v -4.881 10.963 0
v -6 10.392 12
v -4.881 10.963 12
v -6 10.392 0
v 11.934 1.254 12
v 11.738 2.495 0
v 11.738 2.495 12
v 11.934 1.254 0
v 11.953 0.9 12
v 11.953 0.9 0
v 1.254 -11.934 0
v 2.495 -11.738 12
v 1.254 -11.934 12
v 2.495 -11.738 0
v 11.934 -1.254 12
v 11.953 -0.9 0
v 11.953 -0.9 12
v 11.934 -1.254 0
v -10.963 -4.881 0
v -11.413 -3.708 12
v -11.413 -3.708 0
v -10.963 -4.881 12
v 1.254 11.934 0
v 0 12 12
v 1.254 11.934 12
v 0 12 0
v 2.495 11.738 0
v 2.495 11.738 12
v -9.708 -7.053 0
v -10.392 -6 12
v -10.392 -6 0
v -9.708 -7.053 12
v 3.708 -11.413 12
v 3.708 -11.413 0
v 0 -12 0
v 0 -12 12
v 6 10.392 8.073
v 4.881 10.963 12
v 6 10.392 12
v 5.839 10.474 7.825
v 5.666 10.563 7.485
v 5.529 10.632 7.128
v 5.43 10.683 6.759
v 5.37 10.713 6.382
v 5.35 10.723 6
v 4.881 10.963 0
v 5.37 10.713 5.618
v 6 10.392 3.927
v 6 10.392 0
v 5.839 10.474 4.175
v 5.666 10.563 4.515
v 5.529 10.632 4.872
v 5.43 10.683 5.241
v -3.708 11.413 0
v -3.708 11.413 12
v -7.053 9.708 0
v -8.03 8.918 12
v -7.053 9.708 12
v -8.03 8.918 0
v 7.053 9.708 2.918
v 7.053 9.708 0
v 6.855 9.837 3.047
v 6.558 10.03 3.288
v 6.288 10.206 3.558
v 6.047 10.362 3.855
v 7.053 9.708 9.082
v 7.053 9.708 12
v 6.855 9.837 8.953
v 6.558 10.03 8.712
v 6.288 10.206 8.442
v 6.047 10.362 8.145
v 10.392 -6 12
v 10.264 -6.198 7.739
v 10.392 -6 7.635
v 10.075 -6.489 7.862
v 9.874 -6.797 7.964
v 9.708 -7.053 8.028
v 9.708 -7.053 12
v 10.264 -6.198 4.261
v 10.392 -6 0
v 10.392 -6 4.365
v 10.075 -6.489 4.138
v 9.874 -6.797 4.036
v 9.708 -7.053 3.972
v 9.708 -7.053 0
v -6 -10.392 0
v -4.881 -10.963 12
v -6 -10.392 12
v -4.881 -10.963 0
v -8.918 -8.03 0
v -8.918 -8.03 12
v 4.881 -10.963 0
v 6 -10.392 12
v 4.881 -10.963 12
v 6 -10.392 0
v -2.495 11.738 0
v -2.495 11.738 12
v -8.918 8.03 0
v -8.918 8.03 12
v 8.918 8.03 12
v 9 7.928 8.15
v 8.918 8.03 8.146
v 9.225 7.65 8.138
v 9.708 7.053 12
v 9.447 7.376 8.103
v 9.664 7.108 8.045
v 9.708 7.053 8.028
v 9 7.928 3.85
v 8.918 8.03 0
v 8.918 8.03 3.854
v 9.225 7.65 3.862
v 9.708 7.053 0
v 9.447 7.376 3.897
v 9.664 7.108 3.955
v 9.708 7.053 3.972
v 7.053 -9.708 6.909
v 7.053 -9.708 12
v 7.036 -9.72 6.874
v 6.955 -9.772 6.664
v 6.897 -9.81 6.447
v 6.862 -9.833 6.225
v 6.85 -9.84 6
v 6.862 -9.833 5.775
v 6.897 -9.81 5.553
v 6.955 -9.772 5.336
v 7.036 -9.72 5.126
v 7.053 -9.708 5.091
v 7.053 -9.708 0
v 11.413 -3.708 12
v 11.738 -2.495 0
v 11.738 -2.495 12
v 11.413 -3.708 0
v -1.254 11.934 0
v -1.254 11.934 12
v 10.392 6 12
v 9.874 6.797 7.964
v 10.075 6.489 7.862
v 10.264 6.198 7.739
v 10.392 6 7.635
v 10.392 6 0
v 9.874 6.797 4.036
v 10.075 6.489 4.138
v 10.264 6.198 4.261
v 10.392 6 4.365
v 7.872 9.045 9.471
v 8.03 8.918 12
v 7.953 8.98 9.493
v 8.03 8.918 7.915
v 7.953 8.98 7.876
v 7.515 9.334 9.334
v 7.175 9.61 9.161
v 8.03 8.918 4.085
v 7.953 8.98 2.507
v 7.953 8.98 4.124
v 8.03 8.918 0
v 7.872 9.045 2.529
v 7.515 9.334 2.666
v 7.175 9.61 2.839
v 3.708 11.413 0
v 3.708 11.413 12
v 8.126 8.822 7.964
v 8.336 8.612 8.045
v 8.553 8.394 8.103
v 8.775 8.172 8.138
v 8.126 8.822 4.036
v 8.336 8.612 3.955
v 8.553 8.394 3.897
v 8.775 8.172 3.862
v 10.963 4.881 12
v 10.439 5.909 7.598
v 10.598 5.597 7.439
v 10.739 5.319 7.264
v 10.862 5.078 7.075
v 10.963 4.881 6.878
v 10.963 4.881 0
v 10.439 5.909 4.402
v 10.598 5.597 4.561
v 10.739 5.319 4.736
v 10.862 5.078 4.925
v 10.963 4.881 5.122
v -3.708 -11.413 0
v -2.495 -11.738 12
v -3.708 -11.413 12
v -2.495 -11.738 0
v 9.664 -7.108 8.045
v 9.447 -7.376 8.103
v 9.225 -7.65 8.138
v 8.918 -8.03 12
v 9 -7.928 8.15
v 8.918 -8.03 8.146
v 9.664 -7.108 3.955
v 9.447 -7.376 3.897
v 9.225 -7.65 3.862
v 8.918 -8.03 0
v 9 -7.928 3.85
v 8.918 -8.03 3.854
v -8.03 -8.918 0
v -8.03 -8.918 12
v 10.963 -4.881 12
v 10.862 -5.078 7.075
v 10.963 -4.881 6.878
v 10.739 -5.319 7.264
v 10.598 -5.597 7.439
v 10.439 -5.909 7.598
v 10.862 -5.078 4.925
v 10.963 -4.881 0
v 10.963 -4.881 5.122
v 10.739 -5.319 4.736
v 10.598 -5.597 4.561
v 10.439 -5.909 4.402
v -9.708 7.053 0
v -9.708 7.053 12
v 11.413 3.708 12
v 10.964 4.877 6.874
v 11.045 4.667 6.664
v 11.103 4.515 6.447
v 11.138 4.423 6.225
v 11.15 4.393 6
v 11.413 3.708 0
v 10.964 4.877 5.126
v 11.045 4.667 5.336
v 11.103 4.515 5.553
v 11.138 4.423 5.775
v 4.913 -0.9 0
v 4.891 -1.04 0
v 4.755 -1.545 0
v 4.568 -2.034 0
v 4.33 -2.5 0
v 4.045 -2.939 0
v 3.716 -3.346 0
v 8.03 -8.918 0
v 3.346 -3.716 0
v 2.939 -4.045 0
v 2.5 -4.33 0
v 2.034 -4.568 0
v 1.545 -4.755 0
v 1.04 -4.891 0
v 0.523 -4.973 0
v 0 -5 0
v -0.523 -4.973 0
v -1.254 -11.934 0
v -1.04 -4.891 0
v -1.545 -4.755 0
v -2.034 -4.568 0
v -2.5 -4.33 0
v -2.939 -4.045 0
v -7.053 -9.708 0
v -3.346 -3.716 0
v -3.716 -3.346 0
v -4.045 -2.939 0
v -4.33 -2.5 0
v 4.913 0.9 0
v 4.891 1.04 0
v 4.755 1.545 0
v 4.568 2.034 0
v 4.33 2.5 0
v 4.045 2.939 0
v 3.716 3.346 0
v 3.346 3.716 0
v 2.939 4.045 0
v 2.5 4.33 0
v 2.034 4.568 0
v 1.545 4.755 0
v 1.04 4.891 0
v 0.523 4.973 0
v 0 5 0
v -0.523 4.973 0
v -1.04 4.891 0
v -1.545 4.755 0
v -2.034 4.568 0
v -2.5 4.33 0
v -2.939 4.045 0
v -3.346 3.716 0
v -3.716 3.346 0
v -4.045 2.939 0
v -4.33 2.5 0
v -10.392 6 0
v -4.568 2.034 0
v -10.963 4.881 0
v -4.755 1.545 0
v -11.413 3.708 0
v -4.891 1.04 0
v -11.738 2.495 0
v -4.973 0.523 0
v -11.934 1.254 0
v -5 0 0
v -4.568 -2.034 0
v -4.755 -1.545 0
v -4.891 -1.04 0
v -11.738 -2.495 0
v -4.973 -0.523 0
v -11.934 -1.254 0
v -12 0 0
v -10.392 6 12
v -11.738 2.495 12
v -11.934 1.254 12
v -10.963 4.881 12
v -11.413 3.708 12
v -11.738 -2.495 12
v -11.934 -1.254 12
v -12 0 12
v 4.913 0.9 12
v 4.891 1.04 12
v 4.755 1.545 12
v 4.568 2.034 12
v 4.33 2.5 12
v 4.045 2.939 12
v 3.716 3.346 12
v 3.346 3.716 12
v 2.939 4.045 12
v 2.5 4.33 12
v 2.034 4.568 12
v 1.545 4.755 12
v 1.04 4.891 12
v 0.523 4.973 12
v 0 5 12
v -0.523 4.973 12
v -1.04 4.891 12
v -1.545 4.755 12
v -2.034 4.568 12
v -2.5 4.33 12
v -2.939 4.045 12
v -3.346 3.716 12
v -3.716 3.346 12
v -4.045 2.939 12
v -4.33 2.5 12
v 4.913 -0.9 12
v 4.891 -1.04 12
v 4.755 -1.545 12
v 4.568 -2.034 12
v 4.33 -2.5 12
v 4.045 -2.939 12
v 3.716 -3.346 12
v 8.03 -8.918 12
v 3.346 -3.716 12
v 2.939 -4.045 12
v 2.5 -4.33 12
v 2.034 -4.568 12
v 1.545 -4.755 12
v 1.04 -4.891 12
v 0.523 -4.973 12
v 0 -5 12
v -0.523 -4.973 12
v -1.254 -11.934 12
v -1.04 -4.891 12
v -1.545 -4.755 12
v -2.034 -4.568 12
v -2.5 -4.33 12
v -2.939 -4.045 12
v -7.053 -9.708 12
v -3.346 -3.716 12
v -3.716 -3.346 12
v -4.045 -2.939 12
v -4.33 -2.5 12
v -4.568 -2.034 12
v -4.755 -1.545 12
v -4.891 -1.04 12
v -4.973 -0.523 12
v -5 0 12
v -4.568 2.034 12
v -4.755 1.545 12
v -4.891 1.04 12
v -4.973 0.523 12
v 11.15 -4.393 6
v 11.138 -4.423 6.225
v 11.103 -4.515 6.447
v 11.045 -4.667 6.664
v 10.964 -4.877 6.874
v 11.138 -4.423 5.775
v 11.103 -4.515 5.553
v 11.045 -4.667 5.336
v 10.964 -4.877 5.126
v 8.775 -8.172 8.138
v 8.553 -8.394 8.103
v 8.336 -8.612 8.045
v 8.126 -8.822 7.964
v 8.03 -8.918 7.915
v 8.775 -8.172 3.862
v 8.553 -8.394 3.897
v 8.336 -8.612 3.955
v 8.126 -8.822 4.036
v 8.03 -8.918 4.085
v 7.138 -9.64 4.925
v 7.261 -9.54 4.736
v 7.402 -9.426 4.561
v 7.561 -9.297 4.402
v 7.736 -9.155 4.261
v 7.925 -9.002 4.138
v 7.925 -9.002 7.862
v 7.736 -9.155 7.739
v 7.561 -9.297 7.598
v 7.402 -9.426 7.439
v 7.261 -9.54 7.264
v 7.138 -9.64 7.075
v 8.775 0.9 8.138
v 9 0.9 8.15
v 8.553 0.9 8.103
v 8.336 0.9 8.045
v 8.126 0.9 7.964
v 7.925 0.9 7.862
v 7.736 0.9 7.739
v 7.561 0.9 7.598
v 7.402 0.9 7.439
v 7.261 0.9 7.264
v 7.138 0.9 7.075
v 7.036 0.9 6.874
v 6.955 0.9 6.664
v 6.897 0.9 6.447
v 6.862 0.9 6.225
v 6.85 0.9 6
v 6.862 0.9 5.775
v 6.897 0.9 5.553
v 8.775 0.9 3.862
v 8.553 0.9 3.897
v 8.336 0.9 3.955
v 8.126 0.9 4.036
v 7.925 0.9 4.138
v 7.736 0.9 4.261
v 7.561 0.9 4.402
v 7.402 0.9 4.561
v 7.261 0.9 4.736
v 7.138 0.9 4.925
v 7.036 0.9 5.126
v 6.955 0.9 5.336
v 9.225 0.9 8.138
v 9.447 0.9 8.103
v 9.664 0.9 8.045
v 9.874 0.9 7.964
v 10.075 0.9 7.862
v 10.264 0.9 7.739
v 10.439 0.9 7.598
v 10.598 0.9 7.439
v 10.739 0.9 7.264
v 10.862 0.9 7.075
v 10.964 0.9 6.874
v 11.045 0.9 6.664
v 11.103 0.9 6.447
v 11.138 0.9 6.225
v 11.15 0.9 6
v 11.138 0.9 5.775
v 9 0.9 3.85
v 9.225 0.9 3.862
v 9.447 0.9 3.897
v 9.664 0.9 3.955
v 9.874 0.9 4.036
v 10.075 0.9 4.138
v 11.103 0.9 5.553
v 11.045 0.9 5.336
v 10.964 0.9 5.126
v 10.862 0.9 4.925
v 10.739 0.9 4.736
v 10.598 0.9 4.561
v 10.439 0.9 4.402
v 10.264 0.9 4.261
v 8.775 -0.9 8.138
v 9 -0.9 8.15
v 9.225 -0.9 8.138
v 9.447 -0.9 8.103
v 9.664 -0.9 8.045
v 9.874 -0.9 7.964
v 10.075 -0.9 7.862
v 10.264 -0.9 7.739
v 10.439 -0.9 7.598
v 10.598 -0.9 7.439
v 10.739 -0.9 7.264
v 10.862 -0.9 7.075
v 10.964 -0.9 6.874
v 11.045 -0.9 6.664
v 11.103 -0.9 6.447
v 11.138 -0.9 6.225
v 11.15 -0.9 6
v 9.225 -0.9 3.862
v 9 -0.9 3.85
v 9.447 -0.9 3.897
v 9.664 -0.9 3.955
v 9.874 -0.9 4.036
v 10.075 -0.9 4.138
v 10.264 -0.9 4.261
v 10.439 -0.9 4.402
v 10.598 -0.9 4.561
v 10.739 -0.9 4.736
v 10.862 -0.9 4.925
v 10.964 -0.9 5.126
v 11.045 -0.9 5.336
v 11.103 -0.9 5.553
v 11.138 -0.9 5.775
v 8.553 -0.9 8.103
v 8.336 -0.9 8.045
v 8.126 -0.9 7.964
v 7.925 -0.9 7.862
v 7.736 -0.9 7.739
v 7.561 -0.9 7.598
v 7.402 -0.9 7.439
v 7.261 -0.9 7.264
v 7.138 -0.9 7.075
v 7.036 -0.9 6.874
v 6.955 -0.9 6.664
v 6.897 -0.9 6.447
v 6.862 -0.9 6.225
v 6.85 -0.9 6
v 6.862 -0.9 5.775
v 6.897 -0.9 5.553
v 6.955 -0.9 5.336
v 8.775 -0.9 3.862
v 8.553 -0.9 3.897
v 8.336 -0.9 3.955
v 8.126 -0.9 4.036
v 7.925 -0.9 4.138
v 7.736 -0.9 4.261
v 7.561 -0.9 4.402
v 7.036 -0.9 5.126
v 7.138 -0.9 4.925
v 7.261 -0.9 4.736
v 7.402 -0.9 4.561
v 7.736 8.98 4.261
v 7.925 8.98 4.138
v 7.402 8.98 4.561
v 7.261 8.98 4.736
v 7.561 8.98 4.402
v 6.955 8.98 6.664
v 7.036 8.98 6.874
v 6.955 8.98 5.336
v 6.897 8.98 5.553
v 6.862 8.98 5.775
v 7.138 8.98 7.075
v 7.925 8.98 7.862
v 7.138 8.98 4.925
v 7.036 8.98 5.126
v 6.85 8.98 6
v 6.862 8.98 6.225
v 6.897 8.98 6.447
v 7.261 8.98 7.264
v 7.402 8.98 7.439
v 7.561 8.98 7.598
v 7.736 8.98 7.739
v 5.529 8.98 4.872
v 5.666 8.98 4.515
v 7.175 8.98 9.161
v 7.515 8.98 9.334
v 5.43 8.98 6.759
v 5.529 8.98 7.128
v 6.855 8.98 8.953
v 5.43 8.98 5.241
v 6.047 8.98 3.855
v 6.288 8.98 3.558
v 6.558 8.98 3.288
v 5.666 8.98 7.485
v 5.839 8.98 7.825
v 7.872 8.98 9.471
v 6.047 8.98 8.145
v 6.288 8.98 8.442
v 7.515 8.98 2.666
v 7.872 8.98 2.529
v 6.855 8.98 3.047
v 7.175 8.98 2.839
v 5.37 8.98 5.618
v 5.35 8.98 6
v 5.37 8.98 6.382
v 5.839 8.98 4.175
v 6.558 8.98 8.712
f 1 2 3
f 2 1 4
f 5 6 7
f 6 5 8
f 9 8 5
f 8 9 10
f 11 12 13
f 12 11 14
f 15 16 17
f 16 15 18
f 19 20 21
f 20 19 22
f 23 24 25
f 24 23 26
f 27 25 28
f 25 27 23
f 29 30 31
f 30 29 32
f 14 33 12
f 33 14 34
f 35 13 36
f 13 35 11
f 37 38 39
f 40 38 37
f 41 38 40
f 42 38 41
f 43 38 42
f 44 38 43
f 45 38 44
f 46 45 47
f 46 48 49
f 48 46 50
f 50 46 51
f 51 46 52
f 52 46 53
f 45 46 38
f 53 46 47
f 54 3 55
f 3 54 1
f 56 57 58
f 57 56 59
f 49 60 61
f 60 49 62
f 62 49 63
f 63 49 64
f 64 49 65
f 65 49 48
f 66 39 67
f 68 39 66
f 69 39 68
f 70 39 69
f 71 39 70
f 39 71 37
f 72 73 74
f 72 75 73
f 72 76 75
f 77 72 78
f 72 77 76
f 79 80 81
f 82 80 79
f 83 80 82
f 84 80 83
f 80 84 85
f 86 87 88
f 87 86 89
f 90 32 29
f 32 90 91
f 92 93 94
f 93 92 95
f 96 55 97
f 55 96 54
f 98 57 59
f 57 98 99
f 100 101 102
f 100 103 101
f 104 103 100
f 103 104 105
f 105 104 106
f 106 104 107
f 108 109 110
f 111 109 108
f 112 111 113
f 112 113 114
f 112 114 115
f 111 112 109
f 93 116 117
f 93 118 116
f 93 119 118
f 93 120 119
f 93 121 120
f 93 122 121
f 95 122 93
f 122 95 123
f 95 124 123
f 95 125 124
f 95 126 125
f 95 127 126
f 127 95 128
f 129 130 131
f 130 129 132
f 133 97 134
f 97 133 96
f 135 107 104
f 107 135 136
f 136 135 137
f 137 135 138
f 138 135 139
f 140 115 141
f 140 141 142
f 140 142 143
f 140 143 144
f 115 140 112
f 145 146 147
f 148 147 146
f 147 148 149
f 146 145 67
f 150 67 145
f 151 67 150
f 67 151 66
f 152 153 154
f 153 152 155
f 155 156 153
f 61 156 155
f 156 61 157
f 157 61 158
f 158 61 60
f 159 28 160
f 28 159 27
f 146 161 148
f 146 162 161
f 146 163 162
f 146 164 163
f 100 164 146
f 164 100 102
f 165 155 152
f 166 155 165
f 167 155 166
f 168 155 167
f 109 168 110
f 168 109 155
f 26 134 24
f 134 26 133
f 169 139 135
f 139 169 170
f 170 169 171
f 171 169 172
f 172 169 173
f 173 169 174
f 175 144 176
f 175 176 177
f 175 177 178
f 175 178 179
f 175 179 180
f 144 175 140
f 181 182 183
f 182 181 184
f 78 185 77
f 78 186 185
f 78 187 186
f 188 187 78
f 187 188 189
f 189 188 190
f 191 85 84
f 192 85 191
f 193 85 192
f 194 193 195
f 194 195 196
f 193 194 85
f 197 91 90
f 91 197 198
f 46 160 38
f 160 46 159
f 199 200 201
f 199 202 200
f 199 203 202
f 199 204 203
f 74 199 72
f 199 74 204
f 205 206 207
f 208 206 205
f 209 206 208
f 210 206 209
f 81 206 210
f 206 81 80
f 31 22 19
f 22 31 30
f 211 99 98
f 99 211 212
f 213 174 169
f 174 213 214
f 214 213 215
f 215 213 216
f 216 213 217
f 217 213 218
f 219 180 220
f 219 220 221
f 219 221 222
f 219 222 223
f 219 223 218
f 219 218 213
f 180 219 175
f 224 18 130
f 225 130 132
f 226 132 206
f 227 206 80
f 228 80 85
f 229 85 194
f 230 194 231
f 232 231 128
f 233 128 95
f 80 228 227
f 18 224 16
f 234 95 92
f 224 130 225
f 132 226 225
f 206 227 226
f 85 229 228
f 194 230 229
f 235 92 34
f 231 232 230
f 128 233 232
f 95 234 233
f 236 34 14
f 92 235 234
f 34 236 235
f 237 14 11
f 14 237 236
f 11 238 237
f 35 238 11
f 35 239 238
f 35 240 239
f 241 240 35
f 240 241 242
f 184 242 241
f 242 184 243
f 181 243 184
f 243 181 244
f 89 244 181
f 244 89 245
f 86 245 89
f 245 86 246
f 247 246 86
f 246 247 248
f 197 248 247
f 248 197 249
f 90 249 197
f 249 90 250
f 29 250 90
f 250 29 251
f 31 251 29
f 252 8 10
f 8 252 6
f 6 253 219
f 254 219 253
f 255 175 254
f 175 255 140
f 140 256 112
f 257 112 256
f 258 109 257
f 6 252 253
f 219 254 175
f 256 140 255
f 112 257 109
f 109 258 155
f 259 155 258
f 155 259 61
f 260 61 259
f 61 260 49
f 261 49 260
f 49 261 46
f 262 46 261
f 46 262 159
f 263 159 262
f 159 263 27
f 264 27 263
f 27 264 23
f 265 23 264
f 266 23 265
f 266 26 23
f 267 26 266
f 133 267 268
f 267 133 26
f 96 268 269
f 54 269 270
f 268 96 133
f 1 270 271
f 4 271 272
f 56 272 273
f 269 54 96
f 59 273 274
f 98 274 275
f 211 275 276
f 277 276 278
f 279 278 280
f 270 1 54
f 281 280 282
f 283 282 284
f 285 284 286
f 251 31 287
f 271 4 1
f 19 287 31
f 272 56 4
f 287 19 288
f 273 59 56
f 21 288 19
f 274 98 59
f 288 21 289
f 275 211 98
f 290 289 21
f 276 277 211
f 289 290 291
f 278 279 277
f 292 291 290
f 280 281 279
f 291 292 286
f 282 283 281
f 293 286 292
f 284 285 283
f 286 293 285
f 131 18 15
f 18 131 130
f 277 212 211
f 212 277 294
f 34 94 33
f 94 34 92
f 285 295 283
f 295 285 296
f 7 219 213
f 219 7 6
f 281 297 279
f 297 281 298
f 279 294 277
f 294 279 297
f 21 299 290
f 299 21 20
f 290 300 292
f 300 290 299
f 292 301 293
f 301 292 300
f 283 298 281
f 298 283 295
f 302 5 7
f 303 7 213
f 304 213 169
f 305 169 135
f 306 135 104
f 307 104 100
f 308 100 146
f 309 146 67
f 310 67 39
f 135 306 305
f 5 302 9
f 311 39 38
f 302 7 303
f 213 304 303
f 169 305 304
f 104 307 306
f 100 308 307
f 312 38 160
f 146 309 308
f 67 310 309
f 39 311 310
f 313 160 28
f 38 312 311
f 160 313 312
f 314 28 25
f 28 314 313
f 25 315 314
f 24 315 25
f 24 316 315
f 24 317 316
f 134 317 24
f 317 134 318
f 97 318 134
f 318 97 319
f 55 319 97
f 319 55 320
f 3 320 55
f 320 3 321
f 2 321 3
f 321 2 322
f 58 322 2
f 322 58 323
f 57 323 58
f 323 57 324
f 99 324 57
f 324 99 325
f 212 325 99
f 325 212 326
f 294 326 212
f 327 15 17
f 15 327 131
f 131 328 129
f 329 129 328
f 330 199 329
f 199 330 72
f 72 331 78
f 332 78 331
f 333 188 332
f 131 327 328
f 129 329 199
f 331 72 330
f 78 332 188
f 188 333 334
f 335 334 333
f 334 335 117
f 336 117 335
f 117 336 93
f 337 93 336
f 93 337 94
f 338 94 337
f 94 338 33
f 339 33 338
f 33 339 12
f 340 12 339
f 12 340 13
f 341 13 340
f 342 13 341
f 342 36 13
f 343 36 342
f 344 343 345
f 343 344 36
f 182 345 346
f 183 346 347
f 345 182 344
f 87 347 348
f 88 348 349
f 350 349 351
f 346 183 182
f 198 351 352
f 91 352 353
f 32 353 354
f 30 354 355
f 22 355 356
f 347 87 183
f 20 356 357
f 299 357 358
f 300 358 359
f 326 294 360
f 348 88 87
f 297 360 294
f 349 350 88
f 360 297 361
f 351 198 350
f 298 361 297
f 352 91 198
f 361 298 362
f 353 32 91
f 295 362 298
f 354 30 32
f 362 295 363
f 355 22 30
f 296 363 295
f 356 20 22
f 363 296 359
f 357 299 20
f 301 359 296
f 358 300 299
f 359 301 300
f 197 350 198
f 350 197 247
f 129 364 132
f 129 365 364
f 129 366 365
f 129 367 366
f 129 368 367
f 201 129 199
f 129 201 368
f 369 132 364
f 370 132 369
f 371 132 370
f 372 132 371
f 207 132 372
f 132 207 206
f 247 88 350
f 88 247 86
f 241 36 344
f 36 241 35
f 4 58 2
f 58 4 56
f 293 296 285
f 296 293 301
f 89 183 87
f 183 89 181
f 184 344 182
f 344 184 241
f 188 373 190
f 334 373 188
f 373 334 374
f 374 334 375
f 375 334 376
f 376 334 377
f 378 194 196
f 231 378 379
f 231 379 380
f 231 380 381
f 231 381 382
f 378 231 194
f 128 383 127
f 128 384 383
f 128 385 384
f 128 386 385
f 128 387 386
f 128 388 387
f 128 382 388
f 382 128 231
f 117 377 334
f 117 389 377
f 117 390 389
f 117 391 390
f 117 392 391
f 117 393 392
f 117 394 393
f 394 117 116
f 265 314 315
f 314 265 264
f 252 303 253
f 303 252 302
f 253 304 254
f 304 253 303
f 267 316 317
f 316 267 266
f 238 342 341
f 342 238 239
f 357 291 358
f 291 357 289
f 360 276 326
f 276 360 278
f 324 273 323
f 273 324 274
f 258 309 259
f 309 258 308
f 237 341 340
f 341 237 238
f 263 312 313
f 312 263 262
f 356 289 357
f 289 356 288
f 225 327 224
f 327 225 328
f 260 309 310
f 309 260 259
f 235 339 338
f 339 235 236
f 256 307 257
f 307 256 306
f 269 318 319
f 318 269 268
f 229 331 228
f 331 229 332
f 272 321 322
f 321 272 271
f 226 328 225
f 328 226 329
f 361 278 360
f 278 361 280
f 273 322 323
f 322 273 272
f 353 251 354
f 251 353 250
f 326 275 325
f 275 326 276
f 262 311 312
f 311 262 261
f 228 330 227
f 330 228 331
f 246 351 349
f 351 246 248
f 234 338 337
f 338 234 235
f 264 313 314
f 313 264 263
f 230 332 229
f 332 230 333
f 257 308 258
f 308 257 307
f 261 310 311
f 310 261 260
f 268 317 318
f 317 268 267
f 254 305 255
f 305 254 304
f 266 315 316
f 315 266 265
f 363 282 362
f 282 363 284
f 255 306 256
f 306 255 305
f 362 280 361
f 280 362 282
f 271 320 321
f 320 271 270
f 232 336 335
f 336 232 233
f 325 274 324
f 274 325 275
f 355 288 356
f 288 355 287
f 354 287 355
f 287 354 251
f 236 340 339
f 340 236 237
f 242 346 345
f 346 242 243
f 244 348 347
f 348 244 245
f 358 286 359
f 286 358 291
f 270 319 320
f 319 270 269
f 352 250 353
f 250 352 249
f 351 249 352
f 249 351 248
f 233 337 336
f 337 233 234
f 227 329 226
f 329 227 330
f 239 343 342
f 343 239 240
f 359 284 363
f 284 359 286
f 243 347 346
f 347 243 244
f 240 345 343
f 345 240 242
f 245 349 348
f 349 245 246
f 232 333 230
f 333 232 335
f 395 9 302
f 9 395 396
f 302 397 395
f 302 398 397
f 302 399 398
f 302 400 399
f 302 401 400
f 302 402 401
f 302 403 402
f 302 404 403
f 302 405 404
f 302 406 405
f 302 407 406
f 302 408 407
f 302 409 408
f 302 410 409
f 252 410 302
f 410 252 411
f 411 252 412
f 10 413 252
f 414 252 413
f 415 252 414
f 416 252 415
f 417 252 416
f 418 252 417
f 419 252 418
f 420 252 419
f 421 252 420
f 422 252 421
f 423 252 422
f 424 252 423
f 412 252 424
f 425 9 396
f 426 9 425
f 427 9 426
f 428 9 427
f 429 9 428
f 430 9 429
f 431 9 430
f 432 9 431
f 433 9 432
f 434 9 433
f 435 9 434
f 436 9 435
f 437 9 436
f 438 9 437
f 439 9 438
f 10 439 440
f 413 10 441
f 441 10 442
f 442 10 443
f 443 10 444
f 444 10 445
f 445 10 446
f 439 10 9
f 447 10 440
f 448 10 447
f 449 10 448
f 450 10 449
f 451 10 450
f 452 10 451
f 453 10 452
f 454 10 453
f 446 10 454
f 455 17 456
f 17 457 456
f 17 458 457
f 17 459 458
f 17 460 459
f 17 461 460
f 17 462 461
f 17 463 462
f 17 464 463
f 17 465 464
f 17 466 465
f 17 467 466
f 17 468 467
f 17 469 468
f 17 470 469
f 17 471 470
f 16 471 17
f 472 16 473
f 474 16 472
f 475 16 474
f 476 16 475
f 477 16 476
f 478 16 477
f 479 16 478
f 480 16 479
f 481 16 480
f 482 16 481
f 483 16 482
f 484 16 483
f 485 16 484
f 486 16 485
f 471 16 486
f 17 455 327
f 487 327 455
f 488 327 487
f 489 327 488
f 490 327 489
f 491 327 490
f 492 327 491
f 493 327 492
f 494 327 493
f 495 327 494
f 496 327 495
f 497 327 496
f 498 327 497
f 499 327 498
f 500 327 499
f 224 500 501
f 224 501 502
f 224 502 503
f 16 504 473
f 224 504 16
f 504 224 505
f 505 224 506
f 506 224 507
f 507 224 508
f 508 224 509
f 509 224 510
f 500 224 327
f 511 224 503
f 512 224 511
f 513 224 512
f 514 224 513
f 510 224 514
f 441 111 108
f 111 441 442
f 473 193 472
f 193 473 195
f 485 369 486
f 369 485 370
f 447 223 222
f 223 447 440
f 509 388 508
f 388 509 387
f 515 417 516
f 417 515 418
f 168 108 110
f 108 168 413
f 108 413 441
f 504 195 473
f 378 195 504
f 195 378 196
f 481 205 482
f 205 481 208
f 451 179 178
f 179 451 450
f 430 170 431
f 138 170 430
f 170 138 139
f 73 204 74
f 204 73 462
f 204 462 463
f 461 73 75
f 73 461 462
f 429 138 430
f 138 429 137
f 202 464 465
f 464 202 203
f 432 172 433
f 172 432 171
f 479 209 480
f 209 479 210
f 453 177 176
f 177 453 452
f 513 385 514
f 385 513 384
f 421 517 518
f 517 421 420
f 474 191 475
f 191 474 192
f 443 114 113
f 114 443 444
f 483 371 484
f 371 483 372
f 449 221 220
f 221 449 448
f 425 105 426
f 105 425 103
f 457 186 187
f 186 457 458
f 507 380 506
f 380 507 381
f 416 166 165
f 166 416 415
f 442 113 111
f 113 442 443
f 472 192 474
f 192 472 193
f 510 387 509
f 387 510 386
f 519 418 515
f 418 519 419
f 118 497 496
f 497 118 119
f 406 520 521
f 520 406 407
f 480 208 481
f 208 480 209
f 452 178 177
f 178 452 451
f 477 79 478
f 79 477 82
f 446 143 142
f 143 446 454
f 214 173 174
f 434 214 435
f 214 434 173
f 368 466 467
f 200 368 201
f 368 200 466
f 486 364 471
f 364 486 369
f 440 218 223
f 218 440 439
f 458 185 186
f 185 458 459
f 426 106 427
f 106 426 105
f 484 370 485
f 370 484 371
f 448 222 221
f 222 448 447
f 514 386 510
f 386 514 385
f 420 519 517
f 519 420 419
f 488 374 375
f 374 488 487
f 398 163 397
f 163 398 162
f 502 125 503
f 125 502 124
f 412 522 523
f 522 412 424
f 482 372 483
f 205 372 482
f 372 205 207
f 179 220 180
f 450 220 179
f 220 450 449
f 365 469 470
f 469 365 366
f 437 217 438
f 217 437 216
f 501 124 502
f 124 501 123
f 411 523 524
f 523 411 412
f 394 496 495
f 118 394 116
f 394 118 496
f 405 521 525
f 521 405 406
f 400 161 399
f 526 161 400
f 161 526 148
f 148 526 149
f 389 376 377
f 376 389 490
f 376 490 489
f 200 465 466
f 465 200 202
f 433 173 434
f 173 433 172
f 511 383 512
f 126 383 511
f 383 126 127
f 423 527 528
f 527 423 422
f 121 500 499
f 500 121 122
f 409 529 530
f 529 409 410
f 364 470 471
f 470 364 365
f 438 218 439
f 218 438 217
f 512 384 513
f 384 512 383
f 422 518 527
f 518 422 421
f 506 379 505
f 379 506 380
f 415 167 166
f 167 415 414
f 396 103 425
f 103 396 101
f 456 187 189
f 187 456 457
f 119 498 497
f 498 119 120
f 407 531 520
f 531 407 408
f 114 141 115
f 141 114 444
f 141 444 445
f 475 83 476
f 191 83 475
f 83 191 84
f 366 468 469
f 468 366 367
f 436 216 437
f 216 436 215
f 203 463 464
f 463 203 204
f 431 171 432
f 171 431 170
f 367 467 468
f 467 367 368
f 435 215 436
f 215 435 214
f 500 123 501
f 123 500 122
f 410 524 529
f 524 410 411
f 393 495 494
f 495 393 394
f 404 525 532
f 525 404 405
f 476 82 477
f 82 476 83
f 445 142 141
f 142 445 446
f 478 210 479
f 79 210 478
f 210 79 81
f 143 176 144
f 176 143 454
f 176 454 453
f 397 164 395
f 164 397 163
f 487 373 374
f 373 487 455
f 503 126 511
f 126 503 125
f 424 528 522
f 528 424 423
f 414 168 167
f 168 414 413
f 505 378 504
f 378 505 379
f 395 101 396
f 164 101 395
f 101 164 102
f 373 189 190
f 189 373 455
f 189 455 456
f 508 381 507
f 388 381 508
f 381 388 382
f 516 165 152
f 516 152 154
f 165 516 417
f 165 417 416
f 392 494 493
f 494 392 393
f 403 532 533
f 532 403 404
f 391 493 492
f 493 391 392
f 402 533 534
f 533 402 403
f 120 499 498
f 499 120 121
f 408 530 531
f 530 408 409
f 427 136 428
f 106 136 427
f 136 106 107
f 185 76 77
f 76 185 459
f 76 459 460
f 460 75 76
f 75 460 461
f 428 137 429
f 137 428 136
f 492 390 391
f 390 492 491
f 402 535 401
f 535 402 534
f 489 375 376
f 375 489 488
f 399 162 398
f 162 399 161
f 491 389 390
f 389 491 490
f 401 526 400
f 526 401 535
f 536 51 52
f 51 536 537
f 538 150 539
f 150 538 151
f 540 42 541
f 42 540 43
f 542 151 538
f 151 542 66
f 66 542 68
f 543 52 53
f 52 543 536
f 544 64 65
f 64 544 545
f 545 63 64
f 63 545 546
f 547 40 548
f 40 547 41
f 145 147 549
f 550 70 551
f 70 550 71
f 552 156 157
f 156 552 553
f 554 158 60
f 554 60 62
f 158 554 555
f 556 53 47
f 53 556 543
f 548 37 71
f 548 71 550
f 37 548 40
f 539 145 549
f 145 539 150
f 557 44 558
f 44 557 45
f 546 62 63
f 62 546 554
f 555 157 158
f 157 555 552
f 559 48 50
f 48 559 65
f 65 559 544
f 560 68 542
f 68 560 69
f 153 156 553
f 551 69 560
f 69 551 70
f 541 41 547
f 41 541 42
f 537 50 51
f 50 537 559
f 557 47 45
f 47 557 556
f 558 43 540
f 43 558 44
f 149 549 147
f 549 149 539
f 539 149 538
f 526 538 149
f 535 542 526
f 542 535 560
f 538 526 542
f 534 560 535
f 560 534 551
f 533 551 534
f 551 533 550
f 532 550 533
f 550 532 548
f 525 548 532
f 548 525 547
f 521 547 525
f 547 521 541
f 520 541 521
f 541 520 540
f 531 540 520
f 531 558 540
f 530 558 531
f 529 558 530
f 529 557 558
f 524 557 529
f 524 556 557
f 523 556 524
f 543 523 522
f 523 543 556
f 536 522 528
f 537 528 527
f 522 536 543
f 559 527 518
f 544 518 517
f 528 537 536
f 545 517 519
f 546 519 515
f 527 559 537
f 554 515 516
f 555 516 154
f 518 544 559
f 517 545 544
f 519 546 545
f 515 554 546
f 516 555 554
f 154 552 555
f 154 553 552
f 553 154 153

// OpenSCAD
// C-style split collar for 10 mm shaft.
$fn = 60;
eps = 0.02;
shaft_d = 10;
outer_d = 24;
width = 12;
slit_w = 1.8;
screw_d = 4.3;
difference() {
    cylinder(d = outer_d, h = width);
    translate([0, 0, -eps]) cylinder(d = shaft_d, h = width + 2 * eps);
    translate([0, -slit_w / 2, -eps]) cube([outer_d / 2 + eps, slit_w, width + 2 * eps]);
    translate([outer_d / 2 - 3, -outer_d / 2 - eps, width / 2]) rotate([-90, 0, 0]) cylinder(d = screw_d, h = outer_d + 2 * eps);
    translate([outer_d / 2 - 3, outer_d / 2 - 3 - eps, width / 2]) rotate([-90, 0, 0]) cylinder(d = screw_d + 3, h = 3 + 2 * eps);
}
